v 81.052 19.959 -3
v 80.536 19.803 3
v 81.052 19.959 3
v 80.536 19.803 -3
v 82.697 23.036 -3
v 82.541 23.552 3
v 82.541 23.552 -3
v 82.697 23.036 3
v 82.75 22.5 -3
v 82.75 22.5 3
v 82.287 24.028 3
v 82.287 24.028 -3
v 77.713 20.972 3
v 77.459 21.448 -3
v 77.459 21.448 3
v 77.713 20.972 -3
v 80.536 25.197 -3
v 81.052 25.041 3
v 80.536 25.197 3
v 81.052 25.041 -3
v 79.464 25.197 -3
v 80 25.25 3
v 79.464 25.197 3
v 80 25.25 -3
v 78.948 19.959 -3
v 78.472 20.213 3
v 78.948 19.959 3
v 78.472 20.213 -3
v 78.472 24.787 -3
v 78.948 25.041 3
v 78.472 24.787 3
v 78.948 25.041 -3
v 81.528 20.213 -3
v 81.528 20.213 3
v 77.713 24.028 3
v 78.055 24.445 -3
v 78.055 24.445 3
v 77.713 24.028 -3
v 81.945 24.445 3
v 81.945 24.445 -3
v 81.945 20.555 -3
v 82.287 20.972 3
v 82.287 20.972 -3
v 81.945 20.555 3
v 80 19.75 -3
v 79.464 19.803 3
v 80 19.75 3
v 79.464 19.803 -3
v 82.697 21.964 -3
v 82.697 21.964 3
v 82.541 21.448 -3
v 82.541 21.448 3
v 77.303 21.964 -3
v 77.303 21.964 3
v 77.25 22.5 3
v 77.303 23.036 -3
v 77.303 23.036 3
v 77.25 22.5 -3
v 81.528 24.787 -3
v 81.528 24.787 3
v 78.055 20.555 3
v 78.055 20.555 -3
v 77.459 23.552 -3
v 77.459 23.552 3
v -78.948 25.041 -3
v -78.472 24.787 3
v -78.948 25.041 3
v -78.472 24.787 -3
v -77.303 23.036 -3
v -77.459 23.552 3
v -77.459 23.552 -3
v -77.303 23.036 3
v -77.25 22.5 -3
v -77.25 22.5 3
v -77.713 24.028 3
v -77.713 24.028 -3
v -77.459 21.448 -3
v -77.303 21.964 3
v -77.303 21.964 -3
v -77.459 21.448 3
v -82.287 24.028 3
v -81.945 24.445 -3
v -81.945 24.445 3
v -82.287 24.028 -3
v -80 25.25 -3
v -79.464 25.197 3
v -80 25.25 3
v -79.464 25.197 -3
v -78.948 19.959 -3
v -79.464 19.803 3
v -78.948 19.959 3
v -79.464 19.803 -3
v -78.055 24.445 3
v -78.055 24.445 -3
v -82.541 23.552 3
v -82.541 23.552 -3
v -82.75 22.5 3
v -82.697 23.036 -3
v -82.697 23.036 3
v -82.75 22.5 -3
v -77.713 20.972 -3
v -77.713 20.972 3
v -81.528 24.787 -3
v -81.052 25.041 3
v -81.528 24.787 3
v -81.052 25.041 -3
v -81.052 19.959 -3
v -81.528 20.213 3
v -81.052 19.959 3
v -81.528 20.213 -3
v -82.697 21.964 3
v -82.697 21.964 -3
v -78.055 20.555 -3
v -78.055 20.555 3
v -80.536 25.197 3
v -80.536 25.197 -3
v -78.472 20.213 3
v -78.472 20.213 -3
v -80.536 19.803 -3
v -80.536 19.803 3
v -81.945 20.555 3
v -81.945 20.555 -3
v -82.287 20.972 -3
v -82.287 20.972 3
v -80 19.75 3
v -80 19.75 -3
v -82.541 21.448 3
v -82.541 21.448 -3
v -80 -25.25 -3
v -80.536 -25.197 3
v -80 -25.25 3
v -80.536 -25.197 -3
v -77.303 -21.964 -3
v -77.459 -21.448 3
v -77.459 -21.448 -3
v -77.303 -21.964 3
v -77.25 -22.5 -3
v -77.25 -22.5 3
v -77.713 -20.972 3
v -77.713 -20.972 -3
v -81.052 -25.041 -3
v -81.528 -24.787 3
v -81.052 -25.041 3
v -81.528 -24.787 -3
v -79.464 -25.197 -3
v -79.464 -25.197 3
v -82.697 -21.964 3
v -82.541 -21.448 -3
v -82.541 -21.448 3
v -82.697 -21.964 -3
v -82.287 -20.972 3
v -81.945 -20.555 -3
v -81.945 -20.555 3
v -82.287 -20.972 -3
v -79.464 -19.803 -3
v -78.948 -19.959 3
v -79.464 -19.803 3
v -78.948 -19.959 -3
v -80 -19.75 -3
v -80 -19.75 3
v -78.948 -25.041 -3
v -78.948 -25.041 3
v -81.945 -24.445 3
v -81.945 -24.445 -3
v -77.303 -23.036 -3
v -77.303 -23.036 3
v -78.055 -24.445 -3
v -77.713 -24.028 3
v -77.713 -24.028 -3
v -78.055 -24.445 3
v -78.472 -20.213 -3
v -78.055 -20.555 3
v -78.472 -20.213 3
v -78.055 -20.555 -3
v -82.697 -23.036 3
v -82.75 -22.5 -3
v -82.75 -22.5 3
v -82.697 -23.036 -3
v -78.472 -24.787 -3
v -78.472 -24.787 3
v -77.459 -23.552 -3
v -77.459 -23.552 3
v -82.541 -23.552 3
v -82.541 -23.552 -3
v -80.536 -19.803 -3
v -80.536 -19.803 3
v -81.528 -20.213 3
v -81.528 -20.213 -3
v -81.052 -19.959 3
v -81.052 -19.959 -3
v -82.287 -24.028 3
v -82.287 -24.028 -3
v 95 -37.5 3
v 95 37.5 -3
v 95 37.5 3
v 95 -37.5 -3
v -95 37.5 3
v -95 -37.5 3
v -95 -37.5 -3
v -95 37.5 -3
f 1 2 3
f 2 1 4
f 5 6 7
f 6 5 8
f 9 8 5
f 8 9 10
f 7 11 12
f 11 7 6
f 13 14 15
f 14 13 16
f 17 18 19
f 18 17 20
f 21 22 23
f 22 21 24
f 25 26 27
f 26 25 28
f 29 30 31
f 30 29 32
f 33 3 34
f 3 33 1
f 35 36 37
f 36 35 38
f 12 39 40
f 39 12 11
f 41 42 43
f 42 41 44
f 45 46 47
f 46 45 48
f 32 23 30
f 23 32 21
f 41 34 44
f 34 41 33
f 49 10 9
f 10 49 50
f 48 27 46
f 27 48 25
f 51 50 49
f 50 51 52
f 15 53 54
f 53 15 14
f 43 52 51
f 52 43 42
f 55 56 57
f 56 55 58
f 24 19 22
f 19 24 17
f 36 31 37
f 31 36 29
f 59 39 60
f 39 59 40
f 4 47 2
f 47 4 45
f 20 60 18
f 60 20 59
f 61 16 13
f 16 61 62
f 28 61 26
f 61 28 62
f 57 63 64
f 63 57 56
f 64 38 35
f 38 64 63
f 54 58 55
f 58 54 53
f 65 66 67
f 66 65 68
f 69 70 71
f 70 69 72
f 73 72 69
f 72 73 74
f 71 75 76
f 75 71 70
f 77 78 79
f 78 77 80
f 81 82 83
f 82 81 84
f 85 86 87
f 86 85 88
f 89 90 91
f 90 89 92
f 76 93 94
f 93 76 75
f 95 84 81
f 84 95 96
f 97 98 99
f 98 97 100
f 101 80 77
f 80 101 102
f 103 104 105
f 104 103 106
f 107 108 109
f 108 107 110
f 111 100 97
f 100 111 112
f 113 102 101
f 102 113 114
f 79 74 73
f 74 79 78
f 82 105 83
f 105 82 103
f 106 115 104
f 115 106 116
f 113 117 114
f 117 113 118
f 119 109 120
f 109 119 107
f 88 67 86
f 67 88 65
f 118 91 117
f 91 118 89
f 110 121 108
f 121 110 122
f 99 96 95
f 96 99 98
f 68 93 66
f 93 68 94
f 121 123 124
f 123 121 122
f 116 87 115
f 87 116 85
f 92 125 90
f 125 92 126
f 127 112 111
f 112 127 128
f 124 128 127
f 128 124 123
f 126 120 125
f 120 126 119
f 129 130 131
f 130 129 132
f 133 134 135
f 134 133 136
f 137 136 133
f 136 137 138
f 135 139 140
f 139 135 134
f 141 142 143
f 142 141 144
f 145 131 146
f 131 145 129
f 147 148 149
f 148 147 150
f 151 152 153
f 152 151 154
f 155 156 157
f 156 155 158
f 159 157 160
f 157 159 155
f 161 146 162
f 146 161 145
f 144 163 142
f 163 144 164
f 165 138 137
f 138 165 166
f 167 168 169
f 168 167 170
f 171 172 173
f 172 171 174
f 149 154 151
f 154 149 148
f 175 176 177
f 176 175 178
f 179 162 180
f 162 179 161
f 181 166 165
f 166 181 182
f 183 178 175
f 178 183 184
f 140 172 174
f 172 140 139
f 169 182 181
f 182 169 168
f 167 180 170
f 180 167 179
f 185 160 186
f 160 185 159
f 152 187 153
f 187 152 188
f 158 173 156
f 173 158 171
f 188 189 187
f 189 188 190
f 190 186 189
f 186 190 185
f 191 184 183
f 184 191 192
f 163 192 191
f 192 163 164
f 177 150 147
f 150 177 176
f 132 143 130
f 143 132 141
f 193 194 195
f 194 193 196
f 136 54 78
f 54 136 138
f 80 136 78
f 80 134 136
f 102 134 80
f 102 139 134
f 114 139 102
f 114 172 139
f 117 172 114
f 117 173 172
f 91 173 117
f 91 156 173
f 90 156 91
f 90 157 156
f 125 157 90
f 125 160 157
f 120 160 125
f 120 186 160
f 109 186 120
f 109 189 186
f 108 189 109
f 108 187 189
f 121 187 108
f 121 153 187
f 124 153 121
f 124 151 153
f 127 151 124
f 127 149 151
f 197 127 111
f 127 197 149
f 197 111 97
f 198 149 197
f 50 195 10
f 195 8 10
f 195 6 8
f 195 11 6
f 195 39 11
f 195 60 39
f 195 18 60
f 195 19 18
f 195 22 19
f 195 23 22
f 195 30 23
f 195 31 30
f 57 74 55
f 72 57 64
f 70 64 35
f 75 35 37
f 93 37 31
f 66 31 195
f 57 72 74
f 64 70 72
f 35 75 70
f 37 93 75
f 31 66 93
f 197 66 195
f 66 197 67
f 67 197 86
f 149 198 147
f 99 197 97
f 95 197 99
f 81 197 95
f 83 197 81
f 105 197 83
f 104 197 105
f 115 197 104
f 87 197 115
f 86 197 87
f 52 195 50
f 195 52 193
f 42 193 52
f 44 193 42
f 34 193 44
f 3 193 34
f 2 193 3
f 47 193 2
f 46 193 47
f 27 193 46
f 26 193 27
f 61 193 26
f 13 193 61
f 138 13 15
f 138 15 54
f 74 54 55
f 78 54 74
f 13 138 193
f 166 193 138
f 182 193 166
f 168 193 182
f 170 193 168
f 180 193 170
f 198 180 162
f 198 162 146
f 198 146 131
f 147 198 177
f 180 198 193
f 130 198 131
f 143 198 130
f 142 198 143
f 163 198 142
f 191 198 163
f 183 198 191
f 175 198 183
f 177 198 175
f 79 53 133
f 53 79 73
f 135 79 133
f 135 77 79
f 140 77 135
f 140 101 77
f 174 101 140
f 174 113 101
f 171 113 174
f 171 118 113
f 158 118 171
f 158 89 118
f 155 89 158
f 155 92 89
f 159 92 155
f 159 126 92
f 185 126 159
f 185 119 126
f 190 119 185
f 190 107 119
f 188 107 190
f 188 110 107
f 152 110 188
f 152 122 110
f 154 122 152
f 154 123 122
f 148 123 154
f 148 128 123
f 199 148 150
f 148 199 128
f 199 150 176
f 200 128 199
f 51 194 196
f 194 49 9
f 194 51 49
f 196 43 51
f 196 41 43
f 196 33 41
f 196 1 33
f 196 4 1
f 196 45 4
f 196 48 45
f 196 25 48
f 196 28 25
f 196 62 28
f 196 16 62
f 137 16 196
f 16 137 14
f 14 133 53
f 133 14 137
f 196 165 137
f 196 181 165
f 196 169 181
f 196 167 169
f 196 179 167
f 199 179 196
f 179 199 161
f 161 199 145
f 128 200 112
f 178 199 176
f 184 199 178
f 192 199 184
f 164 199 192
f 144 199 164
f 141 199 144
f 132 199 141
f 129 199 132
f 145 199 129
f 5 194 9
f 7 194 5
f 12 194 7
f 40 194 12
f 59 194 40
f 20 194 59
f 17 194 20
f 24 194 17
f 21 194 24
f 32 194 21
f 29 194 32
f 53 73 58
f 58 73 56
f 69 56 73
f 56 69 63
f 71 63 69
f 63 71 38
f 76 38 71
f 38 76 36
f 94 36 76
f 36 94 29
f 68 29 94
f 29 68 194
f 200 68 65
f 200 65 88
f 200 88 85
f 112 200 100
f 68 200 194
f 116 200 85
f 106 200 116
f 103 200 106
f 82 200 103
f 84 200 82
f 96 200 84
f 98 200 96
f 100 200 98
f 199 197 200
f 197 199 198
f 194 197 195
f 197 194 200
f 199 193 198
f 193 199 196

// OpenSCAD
$fn = 32;

// ----------------------------------------------------------------------
// Corner plate 190 x 75 x 6
// 3 holes, centres taken from the edge offset
// ----------------------------------------------------------------------

// --- parameters (mm) ---
plate = [190, 75, 6];  // overall size (x, y, z)
holes = 3;             // number of holes the drawing asks for
hole_d = 5.5;          // hole diameter
edge = 15;             // hole centre offset from the plate edge

// --- derived feature positions (mm) ---
corner_x = plate[0] / 2 - edge;  // = 80   corner hole X
corner_y = plate[1] / 2 - edge;  // = 22.5   corner hole Y
feature_centers = [
  [corner_x, corner_y],
  [-corner_x, corner_y],
  [-corner_x, -corner_y]
];   // hole centres the loop below drills

// plate outline, every hole drilled through with the same cutters
difference() {
  cube(plate, center = true);
  for (centre = feature_centers)
    translate([centre[0], centre[1], 0])
      cylinder(d = hole_d, h = plate[2] + 2, center = true);
}
